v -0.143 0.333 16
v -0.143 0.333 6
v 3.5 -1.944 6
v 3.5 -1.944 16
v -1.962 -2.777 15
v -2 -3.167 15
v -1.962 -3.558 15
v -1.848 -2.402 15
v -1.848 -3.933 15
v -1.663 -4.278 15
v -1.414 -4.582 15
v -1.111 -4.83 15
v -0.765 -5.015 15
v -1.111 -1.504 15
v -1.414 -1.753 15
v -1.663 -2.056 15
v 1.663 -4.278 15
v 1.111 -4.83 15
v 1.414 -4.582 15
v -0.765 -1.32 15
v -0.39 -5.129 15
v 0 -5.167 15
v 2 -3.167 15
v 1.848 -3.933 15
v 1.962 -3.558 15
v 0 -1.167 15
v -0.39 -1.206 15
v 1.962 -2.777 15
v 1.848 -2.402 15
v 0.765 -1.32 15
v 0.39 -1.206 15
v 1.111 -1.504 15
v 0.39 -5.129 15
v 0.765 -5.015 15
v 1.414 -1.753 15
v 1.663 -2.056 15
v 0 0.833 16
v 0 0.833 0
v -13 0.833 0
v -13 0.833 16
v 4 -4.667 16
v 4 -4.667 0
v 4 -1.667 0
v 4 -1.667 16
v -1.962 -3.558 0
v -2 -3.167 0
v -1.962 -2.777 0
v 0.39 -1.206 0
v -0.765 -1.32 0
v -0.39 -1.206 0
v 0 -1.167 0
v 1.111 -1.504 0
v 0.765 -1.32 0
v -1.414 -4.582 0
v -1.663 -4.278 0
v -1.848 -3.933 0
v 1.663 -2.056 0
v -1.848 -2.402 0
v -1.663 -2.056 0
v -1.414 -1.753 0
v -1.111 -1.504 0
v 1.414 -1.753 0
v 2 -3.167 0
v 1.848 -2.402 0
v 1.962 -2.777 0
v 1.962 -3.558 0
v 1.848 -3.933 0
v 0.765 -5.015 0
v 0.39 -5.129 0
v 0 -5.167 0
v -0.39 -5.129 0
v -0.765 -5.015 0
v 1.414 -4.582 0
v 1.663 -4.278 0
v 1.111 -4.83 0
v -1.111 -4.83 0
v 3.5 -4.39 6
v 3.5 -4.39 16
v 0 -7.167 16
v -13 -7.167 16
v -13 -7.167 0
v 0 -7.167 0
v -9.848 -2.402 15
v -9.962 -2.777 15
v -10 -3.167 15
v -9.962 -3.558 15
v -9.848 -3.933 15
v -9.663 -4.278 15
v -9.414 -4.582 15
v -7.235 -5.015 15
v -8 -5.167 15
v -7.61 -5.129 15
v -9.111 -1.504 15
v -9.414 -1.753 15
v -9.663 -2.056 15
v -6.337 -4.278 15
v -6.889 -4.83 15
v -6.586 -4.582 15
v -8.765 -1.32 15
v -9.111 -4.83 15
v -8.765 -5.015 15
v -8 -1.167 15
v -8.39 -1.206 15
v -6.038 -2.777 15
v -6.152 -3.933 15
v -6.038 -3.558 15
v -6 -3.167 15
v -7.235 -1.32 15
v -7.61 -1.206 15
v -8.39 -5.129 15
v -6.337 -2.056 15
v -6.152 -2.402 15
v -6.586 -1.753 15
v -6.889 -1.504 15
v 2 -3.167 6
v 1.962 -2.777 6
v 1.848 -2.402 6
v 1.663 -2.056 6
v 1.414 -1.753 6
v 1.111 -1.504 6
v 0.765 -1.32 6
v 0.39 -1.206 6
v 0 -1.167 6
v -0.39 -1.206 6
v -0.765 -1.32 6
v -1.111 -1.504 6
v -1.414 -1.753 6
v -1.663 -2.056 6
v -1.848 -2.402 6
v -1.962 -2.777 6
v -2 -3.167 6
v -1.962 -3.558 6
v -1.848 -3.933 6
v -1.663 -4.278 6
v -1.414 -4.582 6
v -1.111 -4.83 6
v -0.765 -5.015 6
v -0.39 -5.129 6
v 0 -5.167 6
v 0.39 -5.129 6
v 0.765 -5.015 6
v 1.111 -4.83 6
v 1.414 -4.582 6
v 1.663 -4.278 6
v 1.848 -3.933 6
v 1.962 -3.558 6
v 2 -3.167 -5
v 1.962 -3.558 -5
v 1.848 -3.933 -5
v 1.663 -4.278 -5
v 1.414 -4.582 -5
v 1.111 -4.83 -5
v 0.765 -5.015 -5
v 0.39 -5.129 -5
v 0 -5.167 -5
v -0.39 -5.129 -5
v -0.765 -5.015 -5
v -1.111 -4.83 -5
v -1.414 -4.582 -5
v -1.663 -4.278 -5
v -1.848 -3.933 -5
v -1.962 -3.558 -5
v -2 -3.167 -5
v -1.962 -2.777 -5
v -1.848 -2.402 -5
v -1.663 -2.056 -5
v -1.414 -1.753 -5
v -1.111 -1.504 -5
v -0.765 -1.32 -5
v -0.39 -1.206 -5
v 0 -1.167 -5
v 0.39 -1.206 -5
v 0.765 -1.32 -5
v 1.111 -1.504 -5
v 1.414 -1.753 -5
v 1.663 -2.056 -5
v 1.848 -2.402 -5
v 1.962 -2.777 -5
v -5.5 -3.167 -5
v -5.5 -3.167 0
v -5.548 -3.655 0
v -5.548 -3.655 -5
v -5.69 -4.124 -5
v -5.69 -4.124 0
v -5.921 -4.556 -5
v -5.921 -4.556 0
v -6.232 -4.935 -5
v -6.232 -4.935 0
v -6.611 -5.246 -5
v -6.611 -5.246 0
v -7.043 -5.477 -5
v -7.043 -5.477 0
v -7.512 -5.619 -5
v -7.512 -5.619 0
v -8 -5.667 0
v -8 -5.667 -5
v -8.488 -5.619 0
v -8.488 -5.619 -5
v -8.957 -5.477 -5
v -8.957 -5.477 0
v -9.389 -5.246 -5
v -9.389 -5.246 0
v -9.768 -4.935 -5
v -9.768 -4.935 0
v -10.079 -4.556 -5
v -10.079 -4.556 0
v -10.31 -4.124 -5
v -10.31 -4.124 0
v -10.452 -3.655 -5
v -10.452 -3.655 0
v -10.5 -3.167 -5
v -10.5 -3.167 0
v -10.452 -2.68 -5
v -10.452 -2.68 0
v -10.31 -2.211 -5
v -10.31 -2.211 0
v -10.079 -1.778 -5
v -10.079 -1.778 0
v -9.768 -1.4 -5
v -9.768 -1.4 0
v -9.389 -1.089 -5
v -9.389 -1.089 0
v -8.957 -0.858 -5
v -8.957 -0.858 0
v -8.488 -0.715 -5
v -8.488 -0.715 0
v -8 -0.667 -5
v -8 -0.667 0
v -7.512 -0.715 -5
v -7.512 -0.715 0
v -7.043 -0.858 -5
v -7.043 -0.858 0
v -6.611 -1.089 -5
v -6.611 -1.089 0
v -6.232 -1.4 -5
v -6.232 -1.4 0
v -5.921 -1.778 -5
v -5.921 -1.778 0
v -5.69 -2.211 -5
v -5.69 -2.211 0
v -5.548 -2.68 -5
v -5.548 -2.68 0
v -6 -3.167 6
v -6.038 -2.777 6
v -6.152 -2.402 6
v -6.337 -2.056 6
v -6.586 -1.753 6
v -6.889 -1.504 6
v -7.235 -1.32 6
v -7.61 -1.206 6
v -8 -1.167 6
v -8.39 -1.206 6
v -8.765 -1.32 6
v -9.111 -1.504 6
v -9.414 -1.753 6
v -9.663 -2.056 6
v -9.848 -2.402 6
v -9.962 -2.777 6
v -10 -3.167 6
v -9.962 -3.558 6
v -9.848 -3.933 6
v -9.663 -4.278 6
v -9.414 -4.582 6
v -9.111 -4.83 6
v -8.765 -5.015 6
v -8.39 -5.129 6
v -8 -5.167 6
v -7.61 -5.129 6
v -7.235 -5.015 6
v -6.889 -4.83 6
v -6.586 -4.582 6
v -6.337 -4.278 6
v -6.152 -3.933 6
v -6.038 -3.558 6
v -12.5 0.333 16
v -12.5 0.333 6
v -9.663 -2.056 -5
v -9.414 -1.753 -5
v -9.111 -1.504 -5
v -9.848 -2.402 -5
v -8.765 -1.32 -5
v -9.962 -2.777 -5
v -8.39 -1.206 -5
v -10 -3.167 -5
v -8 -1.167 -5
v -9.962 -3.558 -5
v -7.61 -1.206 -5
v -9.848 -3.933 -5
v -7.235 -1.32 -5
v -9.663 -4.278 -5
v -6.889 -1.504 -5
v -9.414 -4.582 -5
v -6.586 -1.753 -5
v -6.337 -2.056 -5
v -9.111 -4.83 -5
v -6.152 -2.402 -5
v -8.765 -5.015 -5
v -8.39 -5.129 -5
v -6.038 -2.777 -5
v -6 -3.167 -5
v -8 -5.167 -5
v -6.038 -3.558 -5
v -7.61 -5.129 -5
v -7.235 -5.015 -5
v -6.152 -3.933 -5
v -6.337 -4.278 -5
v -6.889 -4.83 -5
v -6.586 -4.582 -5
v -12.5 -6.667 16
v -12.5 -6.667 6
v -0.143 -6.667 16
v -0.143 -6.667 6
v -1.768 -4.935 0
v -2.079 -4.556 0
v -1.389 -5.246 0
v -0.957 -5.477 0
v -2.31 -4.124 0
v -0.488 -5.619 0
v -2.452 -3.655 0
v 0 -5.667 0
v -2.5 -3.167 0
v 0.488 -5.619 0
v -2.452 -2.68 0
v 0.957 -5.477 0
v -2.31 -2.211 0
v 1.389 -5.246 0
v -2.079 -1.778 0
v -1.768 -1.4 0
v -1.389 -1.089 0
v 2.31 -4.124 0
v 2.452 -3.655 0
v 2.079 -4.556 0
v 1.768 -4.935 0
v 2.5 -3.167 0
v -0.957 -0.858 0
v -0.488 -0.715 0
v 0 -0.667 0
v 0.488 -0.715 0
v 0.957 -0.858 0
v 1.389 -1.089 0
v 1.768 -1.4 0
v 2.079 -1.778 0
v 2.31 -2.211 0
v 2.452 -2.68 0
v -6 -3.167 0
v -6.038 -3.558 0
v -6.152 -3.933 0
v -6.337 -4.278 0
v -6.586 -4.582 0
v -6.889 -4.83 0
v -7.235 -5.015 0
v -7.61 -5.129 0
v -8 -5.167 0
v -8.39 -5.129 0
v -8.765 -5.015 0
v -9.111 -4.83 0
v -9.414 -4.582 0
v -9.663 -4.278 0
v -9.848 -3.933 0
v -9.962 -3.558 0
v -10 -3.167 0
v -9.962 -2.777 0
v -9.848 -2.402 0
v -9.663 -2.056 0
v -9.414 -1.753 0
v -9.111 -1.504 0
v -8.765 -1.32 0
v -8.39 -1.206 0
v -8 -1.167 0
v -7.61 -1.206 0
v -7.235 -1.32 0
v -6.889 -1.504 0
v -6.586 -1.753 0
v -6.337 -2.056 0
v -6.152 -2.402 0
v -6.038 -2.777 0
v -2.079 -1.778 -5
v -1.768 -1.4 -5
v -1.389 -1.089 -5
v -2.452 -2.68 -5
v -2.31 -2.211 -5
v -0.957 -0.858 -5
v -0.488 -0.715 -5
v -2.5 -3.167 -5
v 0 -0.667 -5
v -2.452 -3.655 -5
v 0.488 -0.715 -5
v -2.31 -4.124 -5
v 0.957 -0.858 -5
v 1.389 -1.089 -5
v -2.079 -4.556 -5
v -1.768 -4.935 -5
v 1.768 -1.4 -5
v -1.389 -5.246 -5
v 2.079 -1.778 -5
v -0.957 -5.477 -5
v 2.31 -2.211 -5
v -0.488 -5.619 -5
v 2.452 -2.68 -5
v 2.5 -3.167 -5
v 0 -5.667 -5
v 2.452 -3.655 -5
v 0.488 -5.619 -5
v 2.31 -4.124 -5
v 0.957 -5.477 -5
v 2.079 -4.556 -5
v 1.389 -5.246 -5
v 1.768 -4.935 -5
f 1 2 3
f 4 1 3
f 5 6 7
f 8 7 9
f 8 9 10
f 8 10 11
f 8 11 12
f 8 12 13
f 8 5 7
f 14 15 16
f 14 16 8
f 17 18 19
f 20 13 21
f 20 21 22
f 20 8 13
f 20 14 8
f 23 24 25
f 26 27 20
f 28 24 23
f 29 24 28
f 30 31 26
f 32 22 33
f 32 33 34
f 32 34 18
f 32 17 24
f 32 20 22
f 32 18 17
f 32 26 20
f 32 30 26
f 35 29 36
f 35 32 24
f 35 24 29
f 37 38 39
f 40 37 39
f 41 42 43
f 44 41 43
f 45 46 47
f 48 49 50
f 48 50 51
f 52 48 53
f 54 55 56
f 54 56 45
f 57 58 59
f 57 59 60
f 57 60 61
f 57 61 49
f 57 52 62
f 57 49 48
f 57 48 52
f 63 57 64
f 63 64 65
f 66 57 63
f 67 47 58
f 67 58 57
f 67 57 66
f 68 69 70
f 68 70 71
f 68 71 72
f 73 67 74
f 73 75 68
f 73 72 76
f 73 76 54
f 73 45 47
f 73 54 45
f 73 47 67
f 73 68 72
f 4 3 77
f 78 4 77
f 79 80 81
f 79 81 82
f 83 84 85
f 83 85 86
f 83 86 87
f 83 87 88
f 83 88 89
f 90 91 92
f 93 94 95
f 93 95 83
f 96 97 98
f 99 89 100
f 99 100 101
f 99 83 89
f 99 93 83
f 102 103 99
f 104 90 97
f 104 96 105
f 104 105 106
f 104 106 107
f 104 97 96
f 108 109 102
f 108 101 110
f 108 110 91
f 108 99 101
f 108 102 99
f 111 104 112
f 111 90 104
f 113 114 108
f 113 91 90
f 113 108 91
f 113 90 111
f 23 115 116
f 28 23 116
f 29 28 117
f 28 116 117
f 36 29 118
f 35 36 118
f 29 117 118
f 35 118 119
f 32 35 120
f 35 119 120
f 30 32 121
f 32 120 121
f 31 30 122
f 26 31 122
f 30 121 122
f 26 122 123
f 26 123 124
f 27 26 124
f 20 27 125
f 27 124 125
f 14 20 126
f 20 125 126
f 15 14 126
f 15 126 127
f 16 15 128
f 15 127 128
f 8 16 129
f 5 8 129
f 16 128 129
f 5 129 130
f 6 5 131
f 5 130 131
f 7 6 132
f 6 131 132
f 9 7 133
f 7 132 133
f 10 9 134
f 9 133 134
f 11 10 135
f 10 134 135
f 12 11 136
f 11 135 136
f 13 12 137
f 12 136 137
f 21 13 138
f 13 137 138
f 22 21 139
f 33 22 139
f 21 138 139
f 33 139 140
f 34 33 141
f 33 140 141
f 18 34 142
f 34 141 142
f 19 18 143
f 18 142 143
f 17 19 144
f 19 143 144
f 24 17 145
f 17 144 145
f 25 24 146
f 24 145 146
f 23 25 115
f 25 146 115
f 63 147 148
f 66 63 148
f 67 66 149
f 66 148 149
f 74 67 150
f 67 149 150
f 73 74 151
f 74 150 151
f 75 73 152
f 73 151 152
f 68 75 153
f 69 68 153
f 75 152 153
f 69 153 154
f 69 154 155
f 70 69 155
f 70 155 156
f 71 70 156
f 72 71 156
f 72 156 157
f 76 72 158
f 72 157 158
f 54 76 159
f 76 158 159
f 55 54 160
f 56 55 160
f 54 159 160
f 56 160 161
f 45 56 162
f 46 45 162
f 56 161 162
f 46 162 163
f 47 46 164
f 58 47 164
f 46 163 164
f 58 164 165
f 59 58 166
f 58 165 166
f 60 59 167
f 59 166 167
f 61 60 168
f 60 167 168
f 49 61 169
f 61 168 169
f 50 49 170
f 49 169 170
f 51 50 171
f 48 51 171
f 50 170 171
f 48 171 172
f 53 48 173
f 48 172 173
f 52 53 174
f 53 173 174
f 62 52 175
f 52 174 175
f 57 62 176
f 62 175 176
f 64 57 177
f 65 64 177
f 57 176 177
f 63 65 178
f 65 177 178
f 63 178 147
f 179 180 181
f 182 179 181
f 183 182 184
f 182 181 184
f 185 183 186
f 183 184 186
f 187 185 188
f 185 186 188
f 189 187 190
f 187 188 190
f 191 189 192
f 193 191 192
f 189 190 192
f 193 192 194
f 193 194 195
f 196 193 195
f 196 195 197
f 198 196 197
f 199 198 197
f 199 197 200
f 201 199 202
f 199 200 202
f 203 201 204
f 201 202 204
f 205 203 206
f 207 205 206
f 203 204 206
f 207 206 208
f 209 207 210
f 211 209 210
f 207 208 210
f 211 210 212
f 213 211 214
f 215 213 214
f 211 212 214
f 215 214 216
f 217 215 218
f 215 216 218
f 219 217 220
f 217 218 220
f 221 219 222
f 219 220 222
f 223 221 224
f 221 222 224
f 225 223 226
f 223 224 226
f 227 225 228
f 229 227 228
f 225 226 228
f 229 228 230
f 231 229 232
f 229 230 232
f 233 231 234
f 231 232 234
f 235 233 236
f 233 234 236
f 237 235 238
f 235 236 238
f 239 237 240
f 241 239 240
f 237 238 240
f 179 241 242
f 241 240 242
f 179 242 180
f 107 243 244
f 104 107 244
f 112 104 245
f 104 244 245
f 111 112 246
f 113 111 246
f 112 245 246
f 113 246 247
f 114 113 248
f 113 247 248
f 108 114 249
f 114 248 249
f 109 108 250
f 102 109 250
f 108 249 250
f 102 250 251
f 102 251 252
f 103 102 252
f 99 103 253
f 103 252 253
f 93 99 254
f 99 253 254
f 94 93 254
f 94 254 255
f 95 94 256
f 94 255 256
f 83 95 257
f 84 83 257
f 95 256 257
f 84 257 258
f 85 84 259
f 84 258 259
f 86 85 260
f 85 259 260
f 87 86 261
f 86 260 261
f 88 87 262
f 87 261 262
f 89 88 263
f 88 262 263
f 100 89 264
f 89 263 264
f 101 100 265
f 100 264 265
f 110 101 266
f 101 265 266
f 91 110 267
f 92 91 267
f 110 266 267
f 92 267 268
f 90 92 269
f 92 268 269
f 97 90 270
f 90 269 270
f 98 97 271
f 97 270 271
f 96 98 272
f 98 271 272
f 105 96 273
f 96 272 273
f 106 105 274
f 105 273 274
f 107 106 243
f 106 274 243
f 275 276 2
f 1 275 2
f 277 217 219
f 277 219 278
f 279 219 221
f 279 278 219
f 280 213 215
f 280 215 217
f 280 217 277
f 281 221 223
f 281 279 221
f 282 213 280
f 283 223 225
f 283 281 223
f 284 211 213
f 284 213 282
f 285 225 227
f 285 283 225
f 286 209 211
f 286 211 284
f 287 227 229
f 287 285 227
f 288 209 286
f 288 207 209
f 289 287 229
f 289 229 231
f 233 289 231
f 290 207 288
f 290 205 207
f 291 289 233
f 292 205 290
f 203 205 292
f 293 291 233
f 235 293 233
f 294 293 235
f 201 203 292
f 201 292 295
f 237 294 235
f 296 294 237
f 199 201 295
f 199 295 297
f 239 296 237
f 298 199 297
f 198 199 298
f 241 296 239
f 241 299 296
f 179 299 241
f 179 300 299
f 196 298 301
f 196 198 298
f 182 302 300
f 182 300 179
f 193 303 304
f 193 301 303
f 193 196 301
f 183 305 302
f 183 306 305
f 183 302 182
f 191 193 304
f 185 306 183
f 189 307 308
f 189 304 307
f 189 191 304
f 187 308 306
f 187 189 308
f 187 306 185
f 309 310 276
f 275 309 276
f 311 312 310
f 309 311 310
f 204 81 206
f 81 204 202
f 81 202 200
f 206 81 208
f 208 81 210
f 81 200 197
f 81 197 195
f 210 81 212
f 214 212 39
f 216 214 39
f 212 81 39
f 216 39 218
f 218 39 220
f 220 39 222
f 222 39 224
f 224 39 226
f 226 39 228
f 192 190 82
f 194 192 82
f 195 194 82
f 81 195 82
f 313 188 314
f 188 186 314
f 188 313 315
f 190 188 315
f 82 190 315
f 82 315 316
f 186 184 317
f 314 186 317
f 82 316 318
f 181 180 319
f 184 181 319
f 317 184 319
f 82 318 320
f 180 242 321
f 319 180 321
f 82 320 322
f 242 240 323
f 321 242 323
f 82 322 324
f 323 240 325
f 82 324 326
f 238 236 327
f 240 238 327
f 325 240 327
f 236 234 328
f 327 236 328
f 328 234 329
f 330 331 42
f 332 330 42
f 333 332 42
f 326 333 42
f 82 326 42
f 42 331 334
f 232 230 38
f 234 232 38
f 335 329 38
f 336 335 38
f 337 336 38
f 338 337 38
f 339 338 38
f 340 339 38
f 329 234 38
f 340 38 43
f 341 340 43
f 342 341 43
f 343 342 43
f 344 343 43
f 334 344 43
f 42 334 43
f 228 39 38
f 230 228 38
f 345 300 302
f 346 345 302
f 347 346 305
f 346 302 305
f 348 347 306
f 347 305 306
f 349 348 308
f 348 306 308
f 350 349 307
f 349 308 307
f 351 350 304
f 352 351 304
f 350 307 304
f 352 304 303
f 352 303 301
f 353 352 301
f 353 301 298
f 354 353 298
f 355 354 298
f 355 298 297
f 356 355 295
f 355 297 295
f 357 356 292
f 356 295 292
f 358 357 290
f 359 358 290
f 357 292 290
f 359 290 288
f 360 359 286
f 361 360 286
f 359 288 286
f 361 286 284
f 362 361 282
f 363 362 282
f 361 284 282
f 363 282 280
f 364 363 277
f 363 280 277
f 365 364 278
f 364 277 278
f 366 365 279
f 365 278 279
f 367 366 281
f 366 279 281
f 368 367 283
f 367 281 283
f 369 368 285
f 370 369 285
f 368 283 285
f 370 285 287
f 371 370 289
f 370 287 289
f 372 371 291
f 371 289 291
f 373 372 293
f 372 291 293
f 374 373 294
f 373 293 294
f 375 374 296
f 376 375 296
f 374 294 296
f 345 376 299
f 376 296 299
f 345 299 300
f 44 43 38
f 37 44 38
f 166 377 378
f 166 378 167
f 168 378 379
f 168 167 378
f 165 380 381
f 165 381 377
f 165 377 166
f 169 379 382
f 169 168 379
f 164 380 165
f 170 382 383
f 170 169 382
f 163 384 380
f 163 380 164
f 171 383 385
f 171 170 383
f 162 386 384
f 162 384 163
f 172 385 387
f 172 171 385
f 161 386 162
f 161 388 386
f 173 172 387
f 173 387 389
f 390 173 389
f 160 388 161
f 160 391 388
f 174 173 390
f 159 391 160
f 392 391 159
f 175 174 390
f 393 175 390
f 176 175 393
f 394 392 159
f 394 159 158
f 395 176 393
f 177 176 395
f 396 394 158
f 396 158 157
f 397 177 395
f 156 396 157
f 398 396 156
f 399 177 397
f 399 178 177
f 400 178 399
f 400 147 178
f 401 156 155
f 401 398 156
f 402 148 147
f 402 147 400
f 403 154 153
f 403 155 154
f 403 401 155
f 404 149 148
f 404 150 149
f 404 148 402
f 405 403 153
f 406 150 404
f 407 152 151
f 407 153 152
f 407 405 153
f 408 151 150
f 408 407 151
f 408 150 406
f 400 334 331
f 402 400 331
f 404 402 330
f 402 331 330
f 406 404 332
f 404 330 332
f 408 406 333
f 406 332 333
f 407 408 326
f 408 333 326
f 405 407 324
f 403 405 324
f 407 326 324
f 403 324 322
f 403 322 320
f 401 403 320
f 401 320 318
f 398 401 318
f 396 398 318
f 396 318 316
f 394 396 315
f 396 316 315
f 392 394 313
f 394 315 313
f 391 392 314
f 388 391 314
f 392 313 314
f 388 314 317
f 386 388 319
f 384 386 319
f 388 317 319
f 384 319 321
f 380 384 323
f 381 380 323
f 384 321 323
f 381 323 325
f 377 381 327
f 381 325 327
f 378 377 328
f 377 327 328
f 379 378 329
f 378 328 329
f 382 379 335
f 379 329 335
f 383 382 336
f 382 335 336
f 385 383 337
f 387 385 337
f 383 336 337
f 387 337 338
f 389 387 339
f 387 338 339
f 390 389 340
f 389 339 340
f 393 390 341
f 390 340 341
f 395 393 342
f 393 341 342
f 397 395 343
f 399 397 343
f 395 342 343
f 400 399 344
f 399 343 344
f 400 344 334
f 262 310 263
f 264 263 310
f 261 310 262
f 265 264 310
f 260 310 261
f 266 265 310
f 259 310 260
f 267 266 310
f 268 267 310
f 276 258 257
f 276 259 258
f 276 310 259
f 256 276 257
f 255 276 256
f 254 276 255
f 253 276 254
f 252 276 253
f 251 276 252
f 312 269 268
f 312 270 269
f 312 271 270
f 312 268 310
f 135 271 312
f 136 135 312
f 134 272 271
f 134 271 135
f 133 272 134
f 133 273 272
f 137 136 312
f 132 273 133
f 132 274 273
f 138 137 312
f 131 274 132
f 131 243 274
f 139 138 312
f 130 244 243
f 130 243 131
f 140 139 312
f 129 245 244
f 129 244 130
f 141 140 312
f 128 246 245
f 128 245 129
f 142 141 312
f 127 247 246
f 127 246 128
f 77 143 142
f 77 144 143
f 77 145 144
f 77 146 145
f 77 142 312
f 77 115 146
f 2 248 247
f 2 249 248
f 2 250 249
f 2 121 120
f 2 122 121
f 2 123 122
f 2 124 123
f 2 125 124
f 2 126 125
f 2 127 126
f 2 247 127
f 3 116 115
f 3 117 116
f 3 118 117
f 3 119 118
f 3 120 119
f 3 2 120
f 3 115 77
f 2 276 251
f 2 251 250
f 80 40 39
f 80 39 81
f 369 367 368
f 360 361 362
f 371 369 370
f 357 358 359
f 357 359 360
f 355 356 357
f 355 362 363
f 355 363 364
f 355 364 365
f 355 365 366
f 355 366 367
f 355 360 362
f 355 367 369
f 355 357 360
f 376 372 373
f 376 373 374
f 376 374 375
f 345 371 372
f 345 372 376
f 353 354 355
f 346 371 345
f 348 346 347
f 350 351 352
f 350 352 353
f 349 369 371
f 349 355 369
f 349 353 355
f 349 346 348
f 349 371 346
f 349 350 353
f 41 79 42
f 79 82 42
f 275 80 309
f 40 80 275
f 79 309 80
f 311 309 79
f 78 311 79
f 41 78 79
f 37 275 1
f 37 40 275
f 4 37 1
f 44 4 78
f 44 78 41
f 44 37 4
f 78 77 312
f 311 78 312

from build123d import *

# Parameters (mm, degrees)
F1_DEPTH = 6
F3_DEPTH = 10
F4_R     = 2.5
F5_DEPTH = 5
F6_R     = 2
F7_DEPTH = 5
F8_R     = 2
F9_DEPTH = 9


with BuildPart() as f1:
    # F0 (on Top) → F1 (new body)
    with BuildSketch(Plane.XY):
        Polygon((-13, 0.832660675), (-13, -7.167339325), (0, -7.167339325), (4, -4.667339325), (4, -1.667339325), (0, 0.832660675), align=None)
    extrude(amount=F1_DEPTH)

    # F2 (on face) → F3 (join)
    with BuildSketch(Plane.XY.offset(6)):
        Polygon((0, 0.832660675), (-13, 0.832660675), (-13, -7.167339325), (0, -7.167339325), (4, -4.667339325), (4, -1.667339325), align=None)
        Polygon((-12.5, 0.332660675), (-0.1433981132, 0.332660675), (3.5, -1.9444631457), (3.5, -4.3902155042), (-0.1433981132, -6.667339325), (-12.5, -6.667339325), align=None, mode=Mode.SUBTRACT)
    extrude(amount=F3_DEPTH)

    # F4 (on face) → F5 (join)
    with BuildSketch(Plane(origin=(0, 0, 0), x_dir=(1, 0, 0), z_dir=(0, 0, -1))):
        with Locations((0, 3.167339325)):
            Circle(F4_R)
        with Locations((-8, 3.167339325)):
            Circle(F4_R)
    extrude(amount=F5_DEPTH)

    # F6 (on face) → F7 (cut)
    with BuildSketch(Plane(origin=(0, 0, -5), x_dir=(1, 0, 0), z_dir=(0, 0, -1))):
        with Locations((-8, 3.167339325)):
            Circle(F6_R)
        with Locations((0, 3.167339325)):
            Circle(F6_R)
    extrude(amount=-F7_DEPTH, mode=Mode.SUBTRACT)

    # F8 (on face) → F9 (join)
    with BuildSketch(Plane.XY.offset(6)):
        with Locations((-8, -3.167339325)):
            Circle(F8_R)
        with Locations((0, -3.167339325)):
            Circle(F8_R)
    extrude(amount=F9_DEPTH)


solid = f1.part
